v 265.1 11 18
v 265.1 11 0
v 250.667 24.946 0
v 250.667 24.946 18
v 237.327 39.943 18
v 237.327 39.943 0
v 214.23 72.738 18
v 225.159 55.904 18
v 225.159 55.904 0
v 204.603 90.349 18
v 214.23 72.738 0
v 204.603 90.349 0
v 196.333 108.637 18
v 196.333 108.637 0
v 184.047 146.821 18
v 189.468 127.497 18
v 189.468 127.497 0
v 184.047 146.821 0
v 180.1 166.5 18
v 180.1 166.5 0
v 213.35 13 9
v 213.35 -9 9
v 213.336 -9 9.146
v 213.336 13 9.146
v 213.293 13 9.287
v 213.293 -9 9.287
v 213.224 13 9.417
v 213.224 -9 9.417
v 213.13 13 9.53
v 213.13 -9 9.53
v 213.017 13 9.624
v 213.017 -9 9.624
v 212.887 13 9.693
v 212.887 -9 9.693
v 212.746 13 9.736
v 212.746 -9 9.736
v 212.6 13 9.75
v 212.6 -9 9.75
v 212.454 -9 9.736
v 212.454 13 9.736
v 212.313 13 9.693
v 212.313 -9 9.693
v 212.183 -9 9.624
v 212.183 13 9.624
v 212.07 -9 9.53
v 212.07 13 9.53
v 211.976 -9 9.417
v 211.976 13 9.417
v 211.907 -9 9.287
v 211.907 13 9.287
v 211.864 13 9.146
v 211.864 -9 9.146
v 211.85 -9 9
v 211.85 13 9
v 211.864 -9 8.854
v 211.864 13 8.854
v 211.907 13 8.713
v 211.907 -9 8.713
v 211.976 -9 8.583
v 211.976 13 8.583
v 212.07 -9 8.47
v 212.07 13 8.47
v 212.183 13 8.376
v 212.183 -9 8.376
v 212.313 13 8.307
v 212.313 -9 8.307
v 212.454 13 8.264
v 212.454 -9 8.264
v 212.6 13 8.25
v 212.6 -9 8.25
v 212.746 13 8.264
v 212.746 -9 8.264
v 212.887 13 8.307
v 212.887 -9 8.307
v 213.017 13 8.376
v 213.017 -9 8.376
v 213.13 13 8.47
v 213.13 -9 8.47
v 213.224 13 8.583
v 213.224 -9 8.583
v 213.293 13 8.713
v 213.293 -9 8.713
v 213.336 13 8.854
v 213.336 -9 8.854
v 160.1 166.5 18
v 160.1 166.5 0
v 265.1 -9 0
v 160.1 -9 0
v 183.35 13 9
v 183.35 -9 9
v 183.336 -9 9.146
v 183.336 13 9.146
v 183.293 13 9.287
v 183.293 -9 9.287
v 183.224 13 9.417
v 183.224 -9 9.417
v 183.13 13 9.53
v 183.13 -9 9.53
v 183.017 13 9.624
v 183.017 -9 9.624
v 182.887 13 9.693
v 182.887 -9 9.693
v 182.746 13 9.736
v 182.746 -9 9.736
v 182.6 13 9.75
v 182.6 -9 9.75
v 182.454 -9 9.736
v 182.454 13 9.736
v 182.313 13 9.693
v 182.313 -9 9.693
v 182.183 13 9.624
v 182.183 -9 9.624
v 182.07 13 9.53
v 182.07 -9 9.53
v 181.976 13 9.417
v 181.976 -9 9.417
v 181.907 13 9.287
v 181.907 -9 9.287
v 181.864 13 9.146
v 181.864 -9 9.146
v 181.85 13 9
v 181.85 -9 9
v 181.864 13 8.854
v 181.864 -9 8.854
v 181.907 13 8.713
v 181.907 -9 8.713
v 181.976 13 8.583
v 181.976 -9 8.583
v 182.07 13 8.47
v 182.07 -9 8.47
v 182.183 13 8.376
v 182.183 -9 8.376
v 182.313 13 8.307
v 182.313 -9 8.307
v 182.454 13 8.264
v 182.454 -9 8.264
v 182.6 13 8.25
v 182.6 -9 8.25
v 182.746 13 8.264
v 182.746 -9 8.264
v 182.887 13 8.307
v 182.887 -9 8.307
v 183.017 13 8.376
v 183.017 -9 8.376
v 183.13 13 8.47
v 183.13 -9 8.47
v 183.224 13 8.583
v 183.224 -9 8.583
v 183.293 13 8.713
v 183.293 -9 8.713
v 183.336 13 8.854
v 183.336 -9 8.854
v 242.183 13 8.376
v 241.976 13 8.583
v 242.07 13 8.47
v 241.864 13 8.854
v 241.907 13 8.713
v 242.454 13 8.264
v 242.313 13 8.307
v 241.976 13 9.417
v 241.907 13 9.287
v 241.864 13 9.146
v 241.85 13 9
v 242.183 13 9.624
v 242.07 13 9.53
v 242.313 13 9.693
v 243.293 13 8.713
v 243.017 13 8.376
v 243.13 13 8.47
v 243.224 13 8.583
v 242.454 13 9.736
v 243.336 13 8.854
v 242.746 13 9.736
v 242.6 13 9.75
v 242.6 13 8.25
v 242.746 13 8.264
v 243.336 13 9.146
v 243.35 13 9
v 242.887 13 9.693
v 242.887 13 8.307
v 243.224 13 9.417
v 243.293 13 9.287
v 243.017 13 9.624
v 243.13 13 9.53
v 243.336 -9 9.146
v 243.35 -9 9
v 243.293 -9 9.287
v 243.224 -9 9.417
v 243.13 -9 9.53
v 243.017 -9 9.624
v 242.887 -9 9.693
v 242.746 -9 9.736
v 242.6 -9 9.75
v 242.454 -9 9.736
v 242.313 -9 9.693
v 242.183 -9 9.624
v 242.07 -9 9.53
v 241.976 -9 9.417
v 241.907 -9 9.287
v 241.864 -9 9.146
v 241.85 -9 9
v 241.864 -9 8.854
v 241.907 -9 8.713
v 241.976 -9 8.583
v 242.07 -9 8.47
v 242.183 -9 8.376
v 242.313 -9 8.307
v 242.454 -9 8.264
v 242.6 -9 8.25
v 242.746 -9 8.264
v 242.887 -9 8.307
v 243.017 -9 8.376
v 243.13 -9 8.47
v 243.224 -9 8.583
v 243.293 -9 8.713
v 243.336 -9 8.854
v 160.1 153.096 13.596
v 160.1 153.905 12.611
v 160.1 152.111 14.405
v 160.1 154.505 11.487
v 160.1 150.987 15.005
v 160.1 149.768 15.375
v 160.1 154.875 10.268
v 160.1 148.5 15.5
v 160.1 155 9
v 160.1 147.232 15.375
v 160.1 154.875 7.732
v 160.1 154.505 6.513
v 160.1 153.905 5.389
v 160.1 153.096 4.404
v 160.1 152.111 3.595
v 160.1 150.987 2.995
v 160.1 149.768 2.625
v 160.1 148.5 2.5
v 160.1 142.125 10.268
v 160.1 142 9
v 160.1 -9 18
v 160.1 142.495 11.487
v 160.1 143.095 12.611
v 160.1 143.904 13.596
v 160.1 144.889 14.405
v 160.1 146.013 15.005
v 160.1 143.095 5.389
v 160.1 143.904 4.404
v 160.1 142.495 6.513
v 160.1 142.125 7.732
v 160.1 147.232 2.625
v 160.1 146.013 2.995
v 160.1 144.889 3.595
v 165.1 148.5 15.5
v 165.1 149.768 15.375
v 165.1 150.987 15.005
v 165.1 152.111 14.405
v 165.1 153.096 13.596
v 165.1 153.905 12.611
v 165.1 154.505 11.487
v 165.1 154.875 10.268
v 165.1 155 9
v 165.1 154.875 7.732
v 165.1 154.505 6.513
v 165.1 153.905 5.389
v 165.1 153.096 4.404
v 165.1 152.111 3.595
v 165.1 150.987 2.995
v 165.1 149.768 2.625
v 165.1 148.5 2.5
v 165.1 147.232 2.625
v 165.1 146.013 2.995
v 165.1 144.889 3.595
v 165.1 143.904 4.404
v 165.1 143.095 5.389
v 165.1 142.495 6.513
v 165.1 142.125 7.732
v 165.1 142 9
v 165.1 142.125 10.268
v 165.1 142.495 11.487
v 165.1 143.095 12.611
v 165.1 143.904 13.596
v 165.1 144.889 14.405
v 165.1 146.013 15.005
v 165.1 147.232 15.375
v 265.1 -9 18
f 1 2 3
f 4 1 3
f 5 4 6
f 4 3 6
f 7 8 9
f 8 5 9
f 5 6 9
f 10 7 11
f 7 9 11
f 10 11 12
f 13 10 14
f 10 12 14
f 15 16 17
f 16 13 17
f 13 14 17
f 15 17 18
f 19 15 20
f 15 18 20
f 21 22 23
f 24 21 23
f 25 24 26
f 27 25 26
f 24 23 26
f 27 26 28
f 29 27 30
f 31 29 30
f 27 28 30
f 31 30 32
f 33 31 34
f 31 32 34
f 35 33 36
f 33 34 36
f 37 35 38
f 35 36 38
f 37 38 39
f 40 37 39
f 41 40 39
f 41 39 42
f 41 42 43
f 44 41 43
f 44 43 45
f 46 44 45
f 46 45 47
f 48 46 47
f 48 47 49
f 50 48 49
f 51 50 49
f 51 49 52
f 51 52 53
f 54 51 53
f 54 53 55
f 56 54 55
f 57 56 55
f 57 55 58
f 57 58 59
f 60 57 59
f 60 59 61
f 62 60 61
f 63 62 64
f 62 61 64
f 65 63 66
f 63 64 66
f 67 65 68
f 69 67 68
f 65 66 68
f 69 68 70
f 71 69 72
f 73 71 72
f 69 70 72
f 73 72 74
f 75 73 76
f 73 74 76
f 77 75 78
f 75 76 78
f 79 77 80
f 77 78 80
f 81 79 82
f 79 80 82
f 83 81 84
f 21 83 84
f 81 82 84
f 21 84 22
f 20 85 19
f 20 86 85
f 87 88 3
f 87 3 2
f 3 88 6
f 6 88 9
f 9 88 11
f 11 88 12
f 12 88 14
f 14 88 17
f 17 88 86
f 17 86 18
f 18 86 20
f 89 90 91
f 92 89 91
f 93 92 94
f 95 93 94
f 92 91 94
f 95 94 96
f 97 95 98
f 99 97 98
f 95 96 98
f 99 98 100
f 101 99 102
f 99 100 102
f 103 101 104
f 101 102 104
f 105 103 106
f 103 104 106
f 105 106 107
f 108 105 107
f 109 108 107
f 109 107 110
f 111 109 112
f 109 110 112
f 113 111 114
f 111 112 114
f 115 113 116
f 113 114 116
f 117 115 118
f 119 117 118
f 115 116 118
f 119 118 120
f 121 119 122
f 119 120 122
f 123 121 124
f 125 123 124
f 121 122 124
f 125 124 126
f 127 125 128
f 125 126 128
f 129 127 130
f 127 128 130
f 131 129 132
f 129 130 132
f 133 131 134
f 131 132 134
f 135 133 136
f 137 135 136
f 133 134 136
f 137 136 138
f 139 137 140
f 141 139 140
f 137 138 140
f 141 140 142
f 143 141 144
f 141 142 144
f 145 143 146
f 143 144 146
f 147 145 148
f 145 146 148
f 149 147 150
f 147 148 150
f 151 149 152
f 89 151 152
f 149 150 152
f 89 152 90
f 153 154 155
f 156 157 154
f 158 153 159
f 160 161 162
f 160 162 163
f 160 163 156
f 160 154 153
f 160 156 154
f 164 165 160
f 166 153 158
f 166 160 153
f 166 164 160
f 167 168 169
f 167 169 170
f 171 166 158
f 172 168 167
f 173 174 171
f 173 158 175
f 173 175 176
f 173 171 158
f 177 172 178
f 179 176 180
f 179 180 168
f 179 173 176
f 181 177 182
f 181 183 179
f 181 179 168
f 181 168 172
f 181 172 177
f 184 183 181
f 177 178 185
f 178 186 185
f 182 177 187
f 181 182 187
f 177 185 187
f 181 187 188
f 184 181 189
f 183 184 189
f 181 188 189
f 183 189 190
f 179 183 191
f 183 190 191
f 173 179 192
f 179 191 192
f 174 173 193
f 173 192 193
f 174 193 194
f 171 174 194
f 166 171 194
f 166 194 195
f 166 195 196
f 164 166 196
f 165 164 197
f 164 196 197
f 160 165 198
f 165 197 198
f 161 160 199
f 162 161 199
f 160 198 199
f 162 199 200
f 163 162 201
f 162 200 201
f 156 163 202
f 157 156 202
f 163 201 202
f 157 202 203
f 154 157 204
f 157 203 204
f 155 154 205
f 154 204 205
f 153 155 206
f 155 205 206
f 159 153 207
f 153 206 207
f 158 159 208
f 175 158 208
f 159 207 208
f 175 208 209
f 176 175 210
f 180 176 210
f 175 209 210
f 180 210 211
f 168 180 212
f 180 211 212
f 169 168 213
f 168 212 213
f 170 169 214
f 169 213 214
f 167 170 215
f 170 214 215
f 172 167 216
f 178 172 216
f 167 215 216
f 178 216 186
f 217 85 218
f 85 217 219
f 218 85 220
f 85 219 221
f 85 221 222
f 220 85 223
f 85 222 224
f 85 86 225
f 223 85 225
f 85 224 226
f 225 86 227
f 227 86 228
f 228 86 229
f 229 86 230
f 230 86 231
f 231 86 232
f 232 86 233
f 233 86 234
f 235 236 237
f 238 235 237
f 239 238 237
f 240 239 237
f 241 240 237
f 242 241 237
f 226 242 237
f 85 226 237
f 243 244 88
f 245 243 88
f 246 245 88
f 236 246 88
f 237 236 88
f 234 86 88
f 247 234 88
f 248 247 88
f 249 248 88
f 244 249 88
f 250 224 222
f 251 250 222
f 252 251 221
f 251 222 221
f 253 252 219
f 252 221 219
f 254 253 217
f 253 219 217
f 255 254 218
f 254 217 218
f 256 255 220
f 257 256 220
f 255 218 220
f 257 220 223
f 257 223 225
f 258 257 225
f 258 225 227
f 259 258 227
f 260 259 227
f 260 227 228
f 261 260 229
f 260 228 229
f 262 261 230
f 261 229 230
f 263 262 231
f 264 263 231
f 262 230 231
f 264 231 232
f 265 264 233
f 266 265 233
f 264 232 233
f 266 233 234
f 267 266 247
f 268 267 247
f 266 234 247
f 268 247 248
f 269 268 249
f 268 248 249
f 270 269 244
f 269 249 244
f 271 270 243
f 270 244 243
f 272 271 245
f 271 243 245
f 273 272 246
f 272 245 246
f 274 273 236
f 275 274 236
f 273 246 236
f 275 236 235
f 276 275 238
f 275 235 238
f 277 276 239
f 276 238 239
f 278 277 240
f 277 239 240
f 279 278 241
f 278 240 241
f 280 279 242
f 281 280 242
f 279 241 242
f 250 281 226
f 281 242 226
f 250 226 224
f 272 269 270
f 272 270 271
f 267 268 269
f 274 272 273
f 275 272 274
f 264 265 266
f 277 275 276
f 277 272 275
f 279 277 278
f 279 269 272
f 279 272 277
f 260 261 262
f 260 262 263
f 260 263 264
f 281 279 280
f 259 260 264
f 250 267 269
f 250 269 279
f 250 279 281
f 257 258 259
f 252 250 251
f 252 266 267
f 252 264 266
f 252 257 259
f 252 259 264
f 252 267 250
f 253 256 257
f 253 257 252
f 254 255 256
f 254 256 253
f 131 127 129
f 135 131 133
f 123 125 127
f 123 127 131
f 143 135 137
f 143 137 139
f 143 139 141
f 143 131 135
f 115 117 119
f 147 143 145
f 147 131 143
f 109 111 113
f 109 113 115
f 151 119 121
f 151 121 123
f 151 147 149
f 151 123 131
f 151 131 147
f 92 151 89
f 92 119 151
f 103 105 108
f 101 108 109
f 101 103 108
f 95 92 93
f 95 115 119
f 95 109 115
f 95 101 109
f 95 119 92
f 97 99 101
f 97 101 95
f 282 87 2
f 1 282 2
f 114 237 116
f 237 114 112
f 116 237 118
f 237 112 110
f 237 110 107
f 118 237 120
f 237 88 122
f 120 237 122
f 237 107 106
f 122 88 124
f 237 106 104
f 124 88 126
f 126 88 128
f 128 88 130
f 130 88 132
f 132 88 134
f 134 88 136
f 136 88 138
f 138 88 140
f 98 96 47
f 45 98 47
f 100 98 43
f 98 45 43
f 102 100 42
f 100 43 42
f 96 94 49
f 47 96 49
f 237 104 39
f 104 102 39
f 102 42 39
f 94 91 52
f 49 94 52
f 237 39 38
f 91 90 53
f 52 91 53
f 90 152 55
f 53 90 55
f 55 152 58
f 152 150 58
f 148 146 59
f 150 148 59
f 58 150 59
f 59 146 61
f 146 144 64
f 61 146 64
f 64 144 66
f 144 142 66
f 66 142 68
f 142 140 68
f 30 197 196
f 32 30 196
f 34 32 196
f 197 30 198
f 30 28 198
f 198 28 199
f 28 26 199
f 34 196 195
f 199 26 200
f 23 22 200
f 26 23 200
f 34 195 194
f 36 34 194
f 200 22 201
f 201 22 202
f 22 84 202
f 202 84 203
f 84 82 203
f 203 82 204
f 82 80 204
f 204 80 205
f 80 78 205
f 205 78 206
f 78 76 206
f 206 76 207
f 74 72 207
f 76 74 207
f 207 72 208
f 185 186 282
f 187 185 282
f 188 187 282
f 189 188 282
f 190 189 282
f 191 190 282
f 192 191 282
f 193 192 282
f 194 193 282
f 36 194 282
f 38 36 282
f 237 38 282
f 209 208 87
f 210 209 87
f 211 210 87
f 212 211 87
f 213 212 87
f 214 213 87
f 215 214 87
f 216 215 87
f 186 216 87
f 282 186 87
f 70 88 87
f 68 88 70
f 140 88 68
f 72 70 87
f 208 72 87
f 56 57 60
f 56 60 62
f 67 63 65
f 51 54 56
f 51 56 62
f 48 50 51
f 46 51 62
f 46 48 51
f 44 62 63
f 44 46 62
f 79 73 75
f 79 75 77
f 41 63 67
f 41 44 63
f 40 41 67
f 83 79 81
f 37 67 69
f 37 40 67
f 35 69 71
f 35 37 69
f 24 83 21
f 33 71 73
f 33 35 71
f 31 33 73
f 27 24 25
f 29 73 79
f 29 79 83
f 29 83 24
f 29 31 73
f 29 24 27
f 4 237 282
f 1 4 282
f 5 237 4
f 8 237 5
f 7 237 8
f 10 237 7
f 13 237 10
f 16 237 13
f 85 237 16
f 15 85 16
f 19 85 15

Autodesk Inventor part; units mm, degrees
ref_plane "YZ Plane" through (0, 0, 0) normal (1, 0, 0) x (0, 1, 0)
ref_plane "XZ Plane" through (0, 0, 0) normal (0, 1, 0) x (-1, 0, 0)
ref_plane "XY Plane" through (0, 0, 0) normal (0, 0, 1) x (1, 0, 0)
sketch "Sketch1" plane through (0, 0, 0) normal (0, 0, 1) x (1, 0, 0)
  line L0 (0, 0) -> (140, 0) construction
  line L1 (140, 0) -> (140, 300) construction
  line L2 (140, 300) -> (0, 300) construction
  line L3 (0, 300) -> (0, 0) construction
  line L4 (70, 308.6686) -> (70, 317.1965) construction
  line L5 (130, 290) -> (130, 293.3347) construction
  line L6 (0, 160.5) -> (-18, 160.5) construction
  line L7 (-18, 160.5) -> (-18, 180.5) construction
  line L8 (-18, 180.5) -> (0, 180.5) construction
  line L9 (0, 180.5) -> (0, 160.5) construction
  line L10 (-16.3067, 150) -> (-26.4998, 150) construction
  circle A0 centre (-9, 170.5) radius 3 construction
  line L11 (-18, 180.5) -> (0, 200.5) construction
  line L12 (0, 139.5) -> (-18, 139.5) construction
  line L13 (-18, 139.5) -> (-18, 119.5) construction
  circle A1 centre (-9, 129.5) radius 3 construction
  line L14 (-18, 119.5) -> (0, 99.5) construction
  line L15 (140, 160.5) -> (158, 160.5) construction
  line L16 (158, 160.5) -> (158, 180.5) construction
  circle A2 centre (149, 170.5) radius 3 construction
  line L17 (158, 180.5) -> (140, 200.5) construction
  line L18 (158, 139.5) -> (158, 119.5) construction
  line L19 (140, 139.5) -> (158, 139.5) construction
  circle A3 centre (149, 129.5) radius 3 construction
  line L20 (158, 119.5) -> (140, 99.5) construction
  line L21 (158, 186) -> (140, 186) construction
  line L22 (140, 186) -> (140, 114) construction
  line L23 (140, 114) -> (158, 114) construction
  line L24 (158, 114) -> (158, 186) construction
  line L25 (158, 156.5) -> (153, 156.5) construction
  line L26 (153, 156.5) -> (153, 143.5) construction
  line L27 (153, 143.5) -> (158, 143.5) construction
  line L28 (158, 143.5) -> (158, 156.5) construction
  line L29 (153, 152) -> (165, 152) construction
  line L30 (165, 152) -> (165, 148) construction
  line L31 (165, 148) -> (153, 148) construction
  line L32 (153, 148) -> (153, 152) construction
  line L33 (158.25, 155.5) -> (159.85, 155.5) construction
  line L34 (159.85, 155.5) -> (159.85, 144.5) construction
  line L35 (159.85, 144.5) -> (158.25, 144.5) construction
  line L36 (158.25, 144.5) -> (158.25, 155.5) construction
  line L37 (160.1, 156.5) -> (165.1, 156.5) construction
  line L38 (165.1, 156.5) -> (165.1, 143.5) construction
  line L39 (165.1, 143.5) -> (160.1, 143.5) construction
  line L40 (160.1, 143.5) -> (160.1, 156.5) construction
  line L41 (160.1, 166.5) -> (160.1, -9)
  line L42 (160.1, 166.5) -> (180.1, 166.5)
  line L43 (160.1, -9) -> (70, -9) construction
  line L44 (160.1, -9) -> (265.1, -9)
  line L45 (265.1, -9) -> (265.1, 11)
  arc A4 (180.1, 166.5) -> (265.1, 11) centre (442.3295, 208.8594) ccw
  point P0 (70, 300)
  point P1 (10, 150)
  point P2 (0, 150)
  point P3 (70, 312.9325)
  point P4 (-21.4032, 150)
  point P5 (-18, 170.5)
  point P6 (-9, 180.5)
  point P7 (153, 150)
  point P8 (140, 150)
  point P9 (153, 150)
  point P10 (158.25, 150)
  dimension "d0" = 140
  dimension "d1" = 300
  dimension "d85" = 18
  dimension "d86" = 20
  dimension "d87" = 10.5
  dimension "d88" = 6
  dimension "d89" = 20
  dimension "racewidth" = 5
  dimension "d110" = 13
  dimension "d111" = 12
  dimension "d112" = 4
  dimension "d113" = 1.6
  dimension "d114" = 5
  dimension "d117" = 11
  dimension "gap" = 0.25
  dimension "d119" = 0.25
  dimension "d120" = 0
  dimension "d121" = 10
  dimension "d122" = 20
  dimension "d123" = 9
  dimension "d124" = 20.1
  dimension "d126" = 105
  dimension "d127" = 20
  dimension "d128" = 0.1
  dimension "d129" = 175.5
  dimension "d132" = 16.5
  dimension "d147" = 90.1
  dimension "d148" = 2.1
extrude "Extrusion1" add sketch "Sketch1" along normal blind 18
sketch "Sketch2" plane through (160.1, -9, 0) normal (-1, 0, 0) x (0, 0, 1)
  circle A0 centre (9, 157.5) radius 6.5
  line L0 (0, 175.5) -> (18, 175.5) projected
  point P0 (0, 9)
  point P1 (9, 175.5)
  dimension "bearingdiameter" = 13
  dimension "d134" = 18
extrude "Extrusion2" cut sketch "Sketch2" against normal blind 5
sketch "Sketch3" plane through (160.1, -9, 0) normal (0, -1, 0) x (1, 0, 0)
  circle A0 centre (22.5, 9) radius 0.75
  line L0 (0, 0) -> (0, 18) projected
  line L1 (0, 0) -> (105, 0) projected
  circle A1 centre (52.5, 9) radius 0.75
  circle A2 centre (82.5, 9) radius 0.75
  point P0 (-160.1, 0)
  point P1 (0, 9)
  point P2 (52.5, 0)
  dimension "d137" = 1.5
  dimension "d140" = 30
extrude "Extrusion3" cut sketch "Sketch3" against normal blind 22
properties part number "arms"
